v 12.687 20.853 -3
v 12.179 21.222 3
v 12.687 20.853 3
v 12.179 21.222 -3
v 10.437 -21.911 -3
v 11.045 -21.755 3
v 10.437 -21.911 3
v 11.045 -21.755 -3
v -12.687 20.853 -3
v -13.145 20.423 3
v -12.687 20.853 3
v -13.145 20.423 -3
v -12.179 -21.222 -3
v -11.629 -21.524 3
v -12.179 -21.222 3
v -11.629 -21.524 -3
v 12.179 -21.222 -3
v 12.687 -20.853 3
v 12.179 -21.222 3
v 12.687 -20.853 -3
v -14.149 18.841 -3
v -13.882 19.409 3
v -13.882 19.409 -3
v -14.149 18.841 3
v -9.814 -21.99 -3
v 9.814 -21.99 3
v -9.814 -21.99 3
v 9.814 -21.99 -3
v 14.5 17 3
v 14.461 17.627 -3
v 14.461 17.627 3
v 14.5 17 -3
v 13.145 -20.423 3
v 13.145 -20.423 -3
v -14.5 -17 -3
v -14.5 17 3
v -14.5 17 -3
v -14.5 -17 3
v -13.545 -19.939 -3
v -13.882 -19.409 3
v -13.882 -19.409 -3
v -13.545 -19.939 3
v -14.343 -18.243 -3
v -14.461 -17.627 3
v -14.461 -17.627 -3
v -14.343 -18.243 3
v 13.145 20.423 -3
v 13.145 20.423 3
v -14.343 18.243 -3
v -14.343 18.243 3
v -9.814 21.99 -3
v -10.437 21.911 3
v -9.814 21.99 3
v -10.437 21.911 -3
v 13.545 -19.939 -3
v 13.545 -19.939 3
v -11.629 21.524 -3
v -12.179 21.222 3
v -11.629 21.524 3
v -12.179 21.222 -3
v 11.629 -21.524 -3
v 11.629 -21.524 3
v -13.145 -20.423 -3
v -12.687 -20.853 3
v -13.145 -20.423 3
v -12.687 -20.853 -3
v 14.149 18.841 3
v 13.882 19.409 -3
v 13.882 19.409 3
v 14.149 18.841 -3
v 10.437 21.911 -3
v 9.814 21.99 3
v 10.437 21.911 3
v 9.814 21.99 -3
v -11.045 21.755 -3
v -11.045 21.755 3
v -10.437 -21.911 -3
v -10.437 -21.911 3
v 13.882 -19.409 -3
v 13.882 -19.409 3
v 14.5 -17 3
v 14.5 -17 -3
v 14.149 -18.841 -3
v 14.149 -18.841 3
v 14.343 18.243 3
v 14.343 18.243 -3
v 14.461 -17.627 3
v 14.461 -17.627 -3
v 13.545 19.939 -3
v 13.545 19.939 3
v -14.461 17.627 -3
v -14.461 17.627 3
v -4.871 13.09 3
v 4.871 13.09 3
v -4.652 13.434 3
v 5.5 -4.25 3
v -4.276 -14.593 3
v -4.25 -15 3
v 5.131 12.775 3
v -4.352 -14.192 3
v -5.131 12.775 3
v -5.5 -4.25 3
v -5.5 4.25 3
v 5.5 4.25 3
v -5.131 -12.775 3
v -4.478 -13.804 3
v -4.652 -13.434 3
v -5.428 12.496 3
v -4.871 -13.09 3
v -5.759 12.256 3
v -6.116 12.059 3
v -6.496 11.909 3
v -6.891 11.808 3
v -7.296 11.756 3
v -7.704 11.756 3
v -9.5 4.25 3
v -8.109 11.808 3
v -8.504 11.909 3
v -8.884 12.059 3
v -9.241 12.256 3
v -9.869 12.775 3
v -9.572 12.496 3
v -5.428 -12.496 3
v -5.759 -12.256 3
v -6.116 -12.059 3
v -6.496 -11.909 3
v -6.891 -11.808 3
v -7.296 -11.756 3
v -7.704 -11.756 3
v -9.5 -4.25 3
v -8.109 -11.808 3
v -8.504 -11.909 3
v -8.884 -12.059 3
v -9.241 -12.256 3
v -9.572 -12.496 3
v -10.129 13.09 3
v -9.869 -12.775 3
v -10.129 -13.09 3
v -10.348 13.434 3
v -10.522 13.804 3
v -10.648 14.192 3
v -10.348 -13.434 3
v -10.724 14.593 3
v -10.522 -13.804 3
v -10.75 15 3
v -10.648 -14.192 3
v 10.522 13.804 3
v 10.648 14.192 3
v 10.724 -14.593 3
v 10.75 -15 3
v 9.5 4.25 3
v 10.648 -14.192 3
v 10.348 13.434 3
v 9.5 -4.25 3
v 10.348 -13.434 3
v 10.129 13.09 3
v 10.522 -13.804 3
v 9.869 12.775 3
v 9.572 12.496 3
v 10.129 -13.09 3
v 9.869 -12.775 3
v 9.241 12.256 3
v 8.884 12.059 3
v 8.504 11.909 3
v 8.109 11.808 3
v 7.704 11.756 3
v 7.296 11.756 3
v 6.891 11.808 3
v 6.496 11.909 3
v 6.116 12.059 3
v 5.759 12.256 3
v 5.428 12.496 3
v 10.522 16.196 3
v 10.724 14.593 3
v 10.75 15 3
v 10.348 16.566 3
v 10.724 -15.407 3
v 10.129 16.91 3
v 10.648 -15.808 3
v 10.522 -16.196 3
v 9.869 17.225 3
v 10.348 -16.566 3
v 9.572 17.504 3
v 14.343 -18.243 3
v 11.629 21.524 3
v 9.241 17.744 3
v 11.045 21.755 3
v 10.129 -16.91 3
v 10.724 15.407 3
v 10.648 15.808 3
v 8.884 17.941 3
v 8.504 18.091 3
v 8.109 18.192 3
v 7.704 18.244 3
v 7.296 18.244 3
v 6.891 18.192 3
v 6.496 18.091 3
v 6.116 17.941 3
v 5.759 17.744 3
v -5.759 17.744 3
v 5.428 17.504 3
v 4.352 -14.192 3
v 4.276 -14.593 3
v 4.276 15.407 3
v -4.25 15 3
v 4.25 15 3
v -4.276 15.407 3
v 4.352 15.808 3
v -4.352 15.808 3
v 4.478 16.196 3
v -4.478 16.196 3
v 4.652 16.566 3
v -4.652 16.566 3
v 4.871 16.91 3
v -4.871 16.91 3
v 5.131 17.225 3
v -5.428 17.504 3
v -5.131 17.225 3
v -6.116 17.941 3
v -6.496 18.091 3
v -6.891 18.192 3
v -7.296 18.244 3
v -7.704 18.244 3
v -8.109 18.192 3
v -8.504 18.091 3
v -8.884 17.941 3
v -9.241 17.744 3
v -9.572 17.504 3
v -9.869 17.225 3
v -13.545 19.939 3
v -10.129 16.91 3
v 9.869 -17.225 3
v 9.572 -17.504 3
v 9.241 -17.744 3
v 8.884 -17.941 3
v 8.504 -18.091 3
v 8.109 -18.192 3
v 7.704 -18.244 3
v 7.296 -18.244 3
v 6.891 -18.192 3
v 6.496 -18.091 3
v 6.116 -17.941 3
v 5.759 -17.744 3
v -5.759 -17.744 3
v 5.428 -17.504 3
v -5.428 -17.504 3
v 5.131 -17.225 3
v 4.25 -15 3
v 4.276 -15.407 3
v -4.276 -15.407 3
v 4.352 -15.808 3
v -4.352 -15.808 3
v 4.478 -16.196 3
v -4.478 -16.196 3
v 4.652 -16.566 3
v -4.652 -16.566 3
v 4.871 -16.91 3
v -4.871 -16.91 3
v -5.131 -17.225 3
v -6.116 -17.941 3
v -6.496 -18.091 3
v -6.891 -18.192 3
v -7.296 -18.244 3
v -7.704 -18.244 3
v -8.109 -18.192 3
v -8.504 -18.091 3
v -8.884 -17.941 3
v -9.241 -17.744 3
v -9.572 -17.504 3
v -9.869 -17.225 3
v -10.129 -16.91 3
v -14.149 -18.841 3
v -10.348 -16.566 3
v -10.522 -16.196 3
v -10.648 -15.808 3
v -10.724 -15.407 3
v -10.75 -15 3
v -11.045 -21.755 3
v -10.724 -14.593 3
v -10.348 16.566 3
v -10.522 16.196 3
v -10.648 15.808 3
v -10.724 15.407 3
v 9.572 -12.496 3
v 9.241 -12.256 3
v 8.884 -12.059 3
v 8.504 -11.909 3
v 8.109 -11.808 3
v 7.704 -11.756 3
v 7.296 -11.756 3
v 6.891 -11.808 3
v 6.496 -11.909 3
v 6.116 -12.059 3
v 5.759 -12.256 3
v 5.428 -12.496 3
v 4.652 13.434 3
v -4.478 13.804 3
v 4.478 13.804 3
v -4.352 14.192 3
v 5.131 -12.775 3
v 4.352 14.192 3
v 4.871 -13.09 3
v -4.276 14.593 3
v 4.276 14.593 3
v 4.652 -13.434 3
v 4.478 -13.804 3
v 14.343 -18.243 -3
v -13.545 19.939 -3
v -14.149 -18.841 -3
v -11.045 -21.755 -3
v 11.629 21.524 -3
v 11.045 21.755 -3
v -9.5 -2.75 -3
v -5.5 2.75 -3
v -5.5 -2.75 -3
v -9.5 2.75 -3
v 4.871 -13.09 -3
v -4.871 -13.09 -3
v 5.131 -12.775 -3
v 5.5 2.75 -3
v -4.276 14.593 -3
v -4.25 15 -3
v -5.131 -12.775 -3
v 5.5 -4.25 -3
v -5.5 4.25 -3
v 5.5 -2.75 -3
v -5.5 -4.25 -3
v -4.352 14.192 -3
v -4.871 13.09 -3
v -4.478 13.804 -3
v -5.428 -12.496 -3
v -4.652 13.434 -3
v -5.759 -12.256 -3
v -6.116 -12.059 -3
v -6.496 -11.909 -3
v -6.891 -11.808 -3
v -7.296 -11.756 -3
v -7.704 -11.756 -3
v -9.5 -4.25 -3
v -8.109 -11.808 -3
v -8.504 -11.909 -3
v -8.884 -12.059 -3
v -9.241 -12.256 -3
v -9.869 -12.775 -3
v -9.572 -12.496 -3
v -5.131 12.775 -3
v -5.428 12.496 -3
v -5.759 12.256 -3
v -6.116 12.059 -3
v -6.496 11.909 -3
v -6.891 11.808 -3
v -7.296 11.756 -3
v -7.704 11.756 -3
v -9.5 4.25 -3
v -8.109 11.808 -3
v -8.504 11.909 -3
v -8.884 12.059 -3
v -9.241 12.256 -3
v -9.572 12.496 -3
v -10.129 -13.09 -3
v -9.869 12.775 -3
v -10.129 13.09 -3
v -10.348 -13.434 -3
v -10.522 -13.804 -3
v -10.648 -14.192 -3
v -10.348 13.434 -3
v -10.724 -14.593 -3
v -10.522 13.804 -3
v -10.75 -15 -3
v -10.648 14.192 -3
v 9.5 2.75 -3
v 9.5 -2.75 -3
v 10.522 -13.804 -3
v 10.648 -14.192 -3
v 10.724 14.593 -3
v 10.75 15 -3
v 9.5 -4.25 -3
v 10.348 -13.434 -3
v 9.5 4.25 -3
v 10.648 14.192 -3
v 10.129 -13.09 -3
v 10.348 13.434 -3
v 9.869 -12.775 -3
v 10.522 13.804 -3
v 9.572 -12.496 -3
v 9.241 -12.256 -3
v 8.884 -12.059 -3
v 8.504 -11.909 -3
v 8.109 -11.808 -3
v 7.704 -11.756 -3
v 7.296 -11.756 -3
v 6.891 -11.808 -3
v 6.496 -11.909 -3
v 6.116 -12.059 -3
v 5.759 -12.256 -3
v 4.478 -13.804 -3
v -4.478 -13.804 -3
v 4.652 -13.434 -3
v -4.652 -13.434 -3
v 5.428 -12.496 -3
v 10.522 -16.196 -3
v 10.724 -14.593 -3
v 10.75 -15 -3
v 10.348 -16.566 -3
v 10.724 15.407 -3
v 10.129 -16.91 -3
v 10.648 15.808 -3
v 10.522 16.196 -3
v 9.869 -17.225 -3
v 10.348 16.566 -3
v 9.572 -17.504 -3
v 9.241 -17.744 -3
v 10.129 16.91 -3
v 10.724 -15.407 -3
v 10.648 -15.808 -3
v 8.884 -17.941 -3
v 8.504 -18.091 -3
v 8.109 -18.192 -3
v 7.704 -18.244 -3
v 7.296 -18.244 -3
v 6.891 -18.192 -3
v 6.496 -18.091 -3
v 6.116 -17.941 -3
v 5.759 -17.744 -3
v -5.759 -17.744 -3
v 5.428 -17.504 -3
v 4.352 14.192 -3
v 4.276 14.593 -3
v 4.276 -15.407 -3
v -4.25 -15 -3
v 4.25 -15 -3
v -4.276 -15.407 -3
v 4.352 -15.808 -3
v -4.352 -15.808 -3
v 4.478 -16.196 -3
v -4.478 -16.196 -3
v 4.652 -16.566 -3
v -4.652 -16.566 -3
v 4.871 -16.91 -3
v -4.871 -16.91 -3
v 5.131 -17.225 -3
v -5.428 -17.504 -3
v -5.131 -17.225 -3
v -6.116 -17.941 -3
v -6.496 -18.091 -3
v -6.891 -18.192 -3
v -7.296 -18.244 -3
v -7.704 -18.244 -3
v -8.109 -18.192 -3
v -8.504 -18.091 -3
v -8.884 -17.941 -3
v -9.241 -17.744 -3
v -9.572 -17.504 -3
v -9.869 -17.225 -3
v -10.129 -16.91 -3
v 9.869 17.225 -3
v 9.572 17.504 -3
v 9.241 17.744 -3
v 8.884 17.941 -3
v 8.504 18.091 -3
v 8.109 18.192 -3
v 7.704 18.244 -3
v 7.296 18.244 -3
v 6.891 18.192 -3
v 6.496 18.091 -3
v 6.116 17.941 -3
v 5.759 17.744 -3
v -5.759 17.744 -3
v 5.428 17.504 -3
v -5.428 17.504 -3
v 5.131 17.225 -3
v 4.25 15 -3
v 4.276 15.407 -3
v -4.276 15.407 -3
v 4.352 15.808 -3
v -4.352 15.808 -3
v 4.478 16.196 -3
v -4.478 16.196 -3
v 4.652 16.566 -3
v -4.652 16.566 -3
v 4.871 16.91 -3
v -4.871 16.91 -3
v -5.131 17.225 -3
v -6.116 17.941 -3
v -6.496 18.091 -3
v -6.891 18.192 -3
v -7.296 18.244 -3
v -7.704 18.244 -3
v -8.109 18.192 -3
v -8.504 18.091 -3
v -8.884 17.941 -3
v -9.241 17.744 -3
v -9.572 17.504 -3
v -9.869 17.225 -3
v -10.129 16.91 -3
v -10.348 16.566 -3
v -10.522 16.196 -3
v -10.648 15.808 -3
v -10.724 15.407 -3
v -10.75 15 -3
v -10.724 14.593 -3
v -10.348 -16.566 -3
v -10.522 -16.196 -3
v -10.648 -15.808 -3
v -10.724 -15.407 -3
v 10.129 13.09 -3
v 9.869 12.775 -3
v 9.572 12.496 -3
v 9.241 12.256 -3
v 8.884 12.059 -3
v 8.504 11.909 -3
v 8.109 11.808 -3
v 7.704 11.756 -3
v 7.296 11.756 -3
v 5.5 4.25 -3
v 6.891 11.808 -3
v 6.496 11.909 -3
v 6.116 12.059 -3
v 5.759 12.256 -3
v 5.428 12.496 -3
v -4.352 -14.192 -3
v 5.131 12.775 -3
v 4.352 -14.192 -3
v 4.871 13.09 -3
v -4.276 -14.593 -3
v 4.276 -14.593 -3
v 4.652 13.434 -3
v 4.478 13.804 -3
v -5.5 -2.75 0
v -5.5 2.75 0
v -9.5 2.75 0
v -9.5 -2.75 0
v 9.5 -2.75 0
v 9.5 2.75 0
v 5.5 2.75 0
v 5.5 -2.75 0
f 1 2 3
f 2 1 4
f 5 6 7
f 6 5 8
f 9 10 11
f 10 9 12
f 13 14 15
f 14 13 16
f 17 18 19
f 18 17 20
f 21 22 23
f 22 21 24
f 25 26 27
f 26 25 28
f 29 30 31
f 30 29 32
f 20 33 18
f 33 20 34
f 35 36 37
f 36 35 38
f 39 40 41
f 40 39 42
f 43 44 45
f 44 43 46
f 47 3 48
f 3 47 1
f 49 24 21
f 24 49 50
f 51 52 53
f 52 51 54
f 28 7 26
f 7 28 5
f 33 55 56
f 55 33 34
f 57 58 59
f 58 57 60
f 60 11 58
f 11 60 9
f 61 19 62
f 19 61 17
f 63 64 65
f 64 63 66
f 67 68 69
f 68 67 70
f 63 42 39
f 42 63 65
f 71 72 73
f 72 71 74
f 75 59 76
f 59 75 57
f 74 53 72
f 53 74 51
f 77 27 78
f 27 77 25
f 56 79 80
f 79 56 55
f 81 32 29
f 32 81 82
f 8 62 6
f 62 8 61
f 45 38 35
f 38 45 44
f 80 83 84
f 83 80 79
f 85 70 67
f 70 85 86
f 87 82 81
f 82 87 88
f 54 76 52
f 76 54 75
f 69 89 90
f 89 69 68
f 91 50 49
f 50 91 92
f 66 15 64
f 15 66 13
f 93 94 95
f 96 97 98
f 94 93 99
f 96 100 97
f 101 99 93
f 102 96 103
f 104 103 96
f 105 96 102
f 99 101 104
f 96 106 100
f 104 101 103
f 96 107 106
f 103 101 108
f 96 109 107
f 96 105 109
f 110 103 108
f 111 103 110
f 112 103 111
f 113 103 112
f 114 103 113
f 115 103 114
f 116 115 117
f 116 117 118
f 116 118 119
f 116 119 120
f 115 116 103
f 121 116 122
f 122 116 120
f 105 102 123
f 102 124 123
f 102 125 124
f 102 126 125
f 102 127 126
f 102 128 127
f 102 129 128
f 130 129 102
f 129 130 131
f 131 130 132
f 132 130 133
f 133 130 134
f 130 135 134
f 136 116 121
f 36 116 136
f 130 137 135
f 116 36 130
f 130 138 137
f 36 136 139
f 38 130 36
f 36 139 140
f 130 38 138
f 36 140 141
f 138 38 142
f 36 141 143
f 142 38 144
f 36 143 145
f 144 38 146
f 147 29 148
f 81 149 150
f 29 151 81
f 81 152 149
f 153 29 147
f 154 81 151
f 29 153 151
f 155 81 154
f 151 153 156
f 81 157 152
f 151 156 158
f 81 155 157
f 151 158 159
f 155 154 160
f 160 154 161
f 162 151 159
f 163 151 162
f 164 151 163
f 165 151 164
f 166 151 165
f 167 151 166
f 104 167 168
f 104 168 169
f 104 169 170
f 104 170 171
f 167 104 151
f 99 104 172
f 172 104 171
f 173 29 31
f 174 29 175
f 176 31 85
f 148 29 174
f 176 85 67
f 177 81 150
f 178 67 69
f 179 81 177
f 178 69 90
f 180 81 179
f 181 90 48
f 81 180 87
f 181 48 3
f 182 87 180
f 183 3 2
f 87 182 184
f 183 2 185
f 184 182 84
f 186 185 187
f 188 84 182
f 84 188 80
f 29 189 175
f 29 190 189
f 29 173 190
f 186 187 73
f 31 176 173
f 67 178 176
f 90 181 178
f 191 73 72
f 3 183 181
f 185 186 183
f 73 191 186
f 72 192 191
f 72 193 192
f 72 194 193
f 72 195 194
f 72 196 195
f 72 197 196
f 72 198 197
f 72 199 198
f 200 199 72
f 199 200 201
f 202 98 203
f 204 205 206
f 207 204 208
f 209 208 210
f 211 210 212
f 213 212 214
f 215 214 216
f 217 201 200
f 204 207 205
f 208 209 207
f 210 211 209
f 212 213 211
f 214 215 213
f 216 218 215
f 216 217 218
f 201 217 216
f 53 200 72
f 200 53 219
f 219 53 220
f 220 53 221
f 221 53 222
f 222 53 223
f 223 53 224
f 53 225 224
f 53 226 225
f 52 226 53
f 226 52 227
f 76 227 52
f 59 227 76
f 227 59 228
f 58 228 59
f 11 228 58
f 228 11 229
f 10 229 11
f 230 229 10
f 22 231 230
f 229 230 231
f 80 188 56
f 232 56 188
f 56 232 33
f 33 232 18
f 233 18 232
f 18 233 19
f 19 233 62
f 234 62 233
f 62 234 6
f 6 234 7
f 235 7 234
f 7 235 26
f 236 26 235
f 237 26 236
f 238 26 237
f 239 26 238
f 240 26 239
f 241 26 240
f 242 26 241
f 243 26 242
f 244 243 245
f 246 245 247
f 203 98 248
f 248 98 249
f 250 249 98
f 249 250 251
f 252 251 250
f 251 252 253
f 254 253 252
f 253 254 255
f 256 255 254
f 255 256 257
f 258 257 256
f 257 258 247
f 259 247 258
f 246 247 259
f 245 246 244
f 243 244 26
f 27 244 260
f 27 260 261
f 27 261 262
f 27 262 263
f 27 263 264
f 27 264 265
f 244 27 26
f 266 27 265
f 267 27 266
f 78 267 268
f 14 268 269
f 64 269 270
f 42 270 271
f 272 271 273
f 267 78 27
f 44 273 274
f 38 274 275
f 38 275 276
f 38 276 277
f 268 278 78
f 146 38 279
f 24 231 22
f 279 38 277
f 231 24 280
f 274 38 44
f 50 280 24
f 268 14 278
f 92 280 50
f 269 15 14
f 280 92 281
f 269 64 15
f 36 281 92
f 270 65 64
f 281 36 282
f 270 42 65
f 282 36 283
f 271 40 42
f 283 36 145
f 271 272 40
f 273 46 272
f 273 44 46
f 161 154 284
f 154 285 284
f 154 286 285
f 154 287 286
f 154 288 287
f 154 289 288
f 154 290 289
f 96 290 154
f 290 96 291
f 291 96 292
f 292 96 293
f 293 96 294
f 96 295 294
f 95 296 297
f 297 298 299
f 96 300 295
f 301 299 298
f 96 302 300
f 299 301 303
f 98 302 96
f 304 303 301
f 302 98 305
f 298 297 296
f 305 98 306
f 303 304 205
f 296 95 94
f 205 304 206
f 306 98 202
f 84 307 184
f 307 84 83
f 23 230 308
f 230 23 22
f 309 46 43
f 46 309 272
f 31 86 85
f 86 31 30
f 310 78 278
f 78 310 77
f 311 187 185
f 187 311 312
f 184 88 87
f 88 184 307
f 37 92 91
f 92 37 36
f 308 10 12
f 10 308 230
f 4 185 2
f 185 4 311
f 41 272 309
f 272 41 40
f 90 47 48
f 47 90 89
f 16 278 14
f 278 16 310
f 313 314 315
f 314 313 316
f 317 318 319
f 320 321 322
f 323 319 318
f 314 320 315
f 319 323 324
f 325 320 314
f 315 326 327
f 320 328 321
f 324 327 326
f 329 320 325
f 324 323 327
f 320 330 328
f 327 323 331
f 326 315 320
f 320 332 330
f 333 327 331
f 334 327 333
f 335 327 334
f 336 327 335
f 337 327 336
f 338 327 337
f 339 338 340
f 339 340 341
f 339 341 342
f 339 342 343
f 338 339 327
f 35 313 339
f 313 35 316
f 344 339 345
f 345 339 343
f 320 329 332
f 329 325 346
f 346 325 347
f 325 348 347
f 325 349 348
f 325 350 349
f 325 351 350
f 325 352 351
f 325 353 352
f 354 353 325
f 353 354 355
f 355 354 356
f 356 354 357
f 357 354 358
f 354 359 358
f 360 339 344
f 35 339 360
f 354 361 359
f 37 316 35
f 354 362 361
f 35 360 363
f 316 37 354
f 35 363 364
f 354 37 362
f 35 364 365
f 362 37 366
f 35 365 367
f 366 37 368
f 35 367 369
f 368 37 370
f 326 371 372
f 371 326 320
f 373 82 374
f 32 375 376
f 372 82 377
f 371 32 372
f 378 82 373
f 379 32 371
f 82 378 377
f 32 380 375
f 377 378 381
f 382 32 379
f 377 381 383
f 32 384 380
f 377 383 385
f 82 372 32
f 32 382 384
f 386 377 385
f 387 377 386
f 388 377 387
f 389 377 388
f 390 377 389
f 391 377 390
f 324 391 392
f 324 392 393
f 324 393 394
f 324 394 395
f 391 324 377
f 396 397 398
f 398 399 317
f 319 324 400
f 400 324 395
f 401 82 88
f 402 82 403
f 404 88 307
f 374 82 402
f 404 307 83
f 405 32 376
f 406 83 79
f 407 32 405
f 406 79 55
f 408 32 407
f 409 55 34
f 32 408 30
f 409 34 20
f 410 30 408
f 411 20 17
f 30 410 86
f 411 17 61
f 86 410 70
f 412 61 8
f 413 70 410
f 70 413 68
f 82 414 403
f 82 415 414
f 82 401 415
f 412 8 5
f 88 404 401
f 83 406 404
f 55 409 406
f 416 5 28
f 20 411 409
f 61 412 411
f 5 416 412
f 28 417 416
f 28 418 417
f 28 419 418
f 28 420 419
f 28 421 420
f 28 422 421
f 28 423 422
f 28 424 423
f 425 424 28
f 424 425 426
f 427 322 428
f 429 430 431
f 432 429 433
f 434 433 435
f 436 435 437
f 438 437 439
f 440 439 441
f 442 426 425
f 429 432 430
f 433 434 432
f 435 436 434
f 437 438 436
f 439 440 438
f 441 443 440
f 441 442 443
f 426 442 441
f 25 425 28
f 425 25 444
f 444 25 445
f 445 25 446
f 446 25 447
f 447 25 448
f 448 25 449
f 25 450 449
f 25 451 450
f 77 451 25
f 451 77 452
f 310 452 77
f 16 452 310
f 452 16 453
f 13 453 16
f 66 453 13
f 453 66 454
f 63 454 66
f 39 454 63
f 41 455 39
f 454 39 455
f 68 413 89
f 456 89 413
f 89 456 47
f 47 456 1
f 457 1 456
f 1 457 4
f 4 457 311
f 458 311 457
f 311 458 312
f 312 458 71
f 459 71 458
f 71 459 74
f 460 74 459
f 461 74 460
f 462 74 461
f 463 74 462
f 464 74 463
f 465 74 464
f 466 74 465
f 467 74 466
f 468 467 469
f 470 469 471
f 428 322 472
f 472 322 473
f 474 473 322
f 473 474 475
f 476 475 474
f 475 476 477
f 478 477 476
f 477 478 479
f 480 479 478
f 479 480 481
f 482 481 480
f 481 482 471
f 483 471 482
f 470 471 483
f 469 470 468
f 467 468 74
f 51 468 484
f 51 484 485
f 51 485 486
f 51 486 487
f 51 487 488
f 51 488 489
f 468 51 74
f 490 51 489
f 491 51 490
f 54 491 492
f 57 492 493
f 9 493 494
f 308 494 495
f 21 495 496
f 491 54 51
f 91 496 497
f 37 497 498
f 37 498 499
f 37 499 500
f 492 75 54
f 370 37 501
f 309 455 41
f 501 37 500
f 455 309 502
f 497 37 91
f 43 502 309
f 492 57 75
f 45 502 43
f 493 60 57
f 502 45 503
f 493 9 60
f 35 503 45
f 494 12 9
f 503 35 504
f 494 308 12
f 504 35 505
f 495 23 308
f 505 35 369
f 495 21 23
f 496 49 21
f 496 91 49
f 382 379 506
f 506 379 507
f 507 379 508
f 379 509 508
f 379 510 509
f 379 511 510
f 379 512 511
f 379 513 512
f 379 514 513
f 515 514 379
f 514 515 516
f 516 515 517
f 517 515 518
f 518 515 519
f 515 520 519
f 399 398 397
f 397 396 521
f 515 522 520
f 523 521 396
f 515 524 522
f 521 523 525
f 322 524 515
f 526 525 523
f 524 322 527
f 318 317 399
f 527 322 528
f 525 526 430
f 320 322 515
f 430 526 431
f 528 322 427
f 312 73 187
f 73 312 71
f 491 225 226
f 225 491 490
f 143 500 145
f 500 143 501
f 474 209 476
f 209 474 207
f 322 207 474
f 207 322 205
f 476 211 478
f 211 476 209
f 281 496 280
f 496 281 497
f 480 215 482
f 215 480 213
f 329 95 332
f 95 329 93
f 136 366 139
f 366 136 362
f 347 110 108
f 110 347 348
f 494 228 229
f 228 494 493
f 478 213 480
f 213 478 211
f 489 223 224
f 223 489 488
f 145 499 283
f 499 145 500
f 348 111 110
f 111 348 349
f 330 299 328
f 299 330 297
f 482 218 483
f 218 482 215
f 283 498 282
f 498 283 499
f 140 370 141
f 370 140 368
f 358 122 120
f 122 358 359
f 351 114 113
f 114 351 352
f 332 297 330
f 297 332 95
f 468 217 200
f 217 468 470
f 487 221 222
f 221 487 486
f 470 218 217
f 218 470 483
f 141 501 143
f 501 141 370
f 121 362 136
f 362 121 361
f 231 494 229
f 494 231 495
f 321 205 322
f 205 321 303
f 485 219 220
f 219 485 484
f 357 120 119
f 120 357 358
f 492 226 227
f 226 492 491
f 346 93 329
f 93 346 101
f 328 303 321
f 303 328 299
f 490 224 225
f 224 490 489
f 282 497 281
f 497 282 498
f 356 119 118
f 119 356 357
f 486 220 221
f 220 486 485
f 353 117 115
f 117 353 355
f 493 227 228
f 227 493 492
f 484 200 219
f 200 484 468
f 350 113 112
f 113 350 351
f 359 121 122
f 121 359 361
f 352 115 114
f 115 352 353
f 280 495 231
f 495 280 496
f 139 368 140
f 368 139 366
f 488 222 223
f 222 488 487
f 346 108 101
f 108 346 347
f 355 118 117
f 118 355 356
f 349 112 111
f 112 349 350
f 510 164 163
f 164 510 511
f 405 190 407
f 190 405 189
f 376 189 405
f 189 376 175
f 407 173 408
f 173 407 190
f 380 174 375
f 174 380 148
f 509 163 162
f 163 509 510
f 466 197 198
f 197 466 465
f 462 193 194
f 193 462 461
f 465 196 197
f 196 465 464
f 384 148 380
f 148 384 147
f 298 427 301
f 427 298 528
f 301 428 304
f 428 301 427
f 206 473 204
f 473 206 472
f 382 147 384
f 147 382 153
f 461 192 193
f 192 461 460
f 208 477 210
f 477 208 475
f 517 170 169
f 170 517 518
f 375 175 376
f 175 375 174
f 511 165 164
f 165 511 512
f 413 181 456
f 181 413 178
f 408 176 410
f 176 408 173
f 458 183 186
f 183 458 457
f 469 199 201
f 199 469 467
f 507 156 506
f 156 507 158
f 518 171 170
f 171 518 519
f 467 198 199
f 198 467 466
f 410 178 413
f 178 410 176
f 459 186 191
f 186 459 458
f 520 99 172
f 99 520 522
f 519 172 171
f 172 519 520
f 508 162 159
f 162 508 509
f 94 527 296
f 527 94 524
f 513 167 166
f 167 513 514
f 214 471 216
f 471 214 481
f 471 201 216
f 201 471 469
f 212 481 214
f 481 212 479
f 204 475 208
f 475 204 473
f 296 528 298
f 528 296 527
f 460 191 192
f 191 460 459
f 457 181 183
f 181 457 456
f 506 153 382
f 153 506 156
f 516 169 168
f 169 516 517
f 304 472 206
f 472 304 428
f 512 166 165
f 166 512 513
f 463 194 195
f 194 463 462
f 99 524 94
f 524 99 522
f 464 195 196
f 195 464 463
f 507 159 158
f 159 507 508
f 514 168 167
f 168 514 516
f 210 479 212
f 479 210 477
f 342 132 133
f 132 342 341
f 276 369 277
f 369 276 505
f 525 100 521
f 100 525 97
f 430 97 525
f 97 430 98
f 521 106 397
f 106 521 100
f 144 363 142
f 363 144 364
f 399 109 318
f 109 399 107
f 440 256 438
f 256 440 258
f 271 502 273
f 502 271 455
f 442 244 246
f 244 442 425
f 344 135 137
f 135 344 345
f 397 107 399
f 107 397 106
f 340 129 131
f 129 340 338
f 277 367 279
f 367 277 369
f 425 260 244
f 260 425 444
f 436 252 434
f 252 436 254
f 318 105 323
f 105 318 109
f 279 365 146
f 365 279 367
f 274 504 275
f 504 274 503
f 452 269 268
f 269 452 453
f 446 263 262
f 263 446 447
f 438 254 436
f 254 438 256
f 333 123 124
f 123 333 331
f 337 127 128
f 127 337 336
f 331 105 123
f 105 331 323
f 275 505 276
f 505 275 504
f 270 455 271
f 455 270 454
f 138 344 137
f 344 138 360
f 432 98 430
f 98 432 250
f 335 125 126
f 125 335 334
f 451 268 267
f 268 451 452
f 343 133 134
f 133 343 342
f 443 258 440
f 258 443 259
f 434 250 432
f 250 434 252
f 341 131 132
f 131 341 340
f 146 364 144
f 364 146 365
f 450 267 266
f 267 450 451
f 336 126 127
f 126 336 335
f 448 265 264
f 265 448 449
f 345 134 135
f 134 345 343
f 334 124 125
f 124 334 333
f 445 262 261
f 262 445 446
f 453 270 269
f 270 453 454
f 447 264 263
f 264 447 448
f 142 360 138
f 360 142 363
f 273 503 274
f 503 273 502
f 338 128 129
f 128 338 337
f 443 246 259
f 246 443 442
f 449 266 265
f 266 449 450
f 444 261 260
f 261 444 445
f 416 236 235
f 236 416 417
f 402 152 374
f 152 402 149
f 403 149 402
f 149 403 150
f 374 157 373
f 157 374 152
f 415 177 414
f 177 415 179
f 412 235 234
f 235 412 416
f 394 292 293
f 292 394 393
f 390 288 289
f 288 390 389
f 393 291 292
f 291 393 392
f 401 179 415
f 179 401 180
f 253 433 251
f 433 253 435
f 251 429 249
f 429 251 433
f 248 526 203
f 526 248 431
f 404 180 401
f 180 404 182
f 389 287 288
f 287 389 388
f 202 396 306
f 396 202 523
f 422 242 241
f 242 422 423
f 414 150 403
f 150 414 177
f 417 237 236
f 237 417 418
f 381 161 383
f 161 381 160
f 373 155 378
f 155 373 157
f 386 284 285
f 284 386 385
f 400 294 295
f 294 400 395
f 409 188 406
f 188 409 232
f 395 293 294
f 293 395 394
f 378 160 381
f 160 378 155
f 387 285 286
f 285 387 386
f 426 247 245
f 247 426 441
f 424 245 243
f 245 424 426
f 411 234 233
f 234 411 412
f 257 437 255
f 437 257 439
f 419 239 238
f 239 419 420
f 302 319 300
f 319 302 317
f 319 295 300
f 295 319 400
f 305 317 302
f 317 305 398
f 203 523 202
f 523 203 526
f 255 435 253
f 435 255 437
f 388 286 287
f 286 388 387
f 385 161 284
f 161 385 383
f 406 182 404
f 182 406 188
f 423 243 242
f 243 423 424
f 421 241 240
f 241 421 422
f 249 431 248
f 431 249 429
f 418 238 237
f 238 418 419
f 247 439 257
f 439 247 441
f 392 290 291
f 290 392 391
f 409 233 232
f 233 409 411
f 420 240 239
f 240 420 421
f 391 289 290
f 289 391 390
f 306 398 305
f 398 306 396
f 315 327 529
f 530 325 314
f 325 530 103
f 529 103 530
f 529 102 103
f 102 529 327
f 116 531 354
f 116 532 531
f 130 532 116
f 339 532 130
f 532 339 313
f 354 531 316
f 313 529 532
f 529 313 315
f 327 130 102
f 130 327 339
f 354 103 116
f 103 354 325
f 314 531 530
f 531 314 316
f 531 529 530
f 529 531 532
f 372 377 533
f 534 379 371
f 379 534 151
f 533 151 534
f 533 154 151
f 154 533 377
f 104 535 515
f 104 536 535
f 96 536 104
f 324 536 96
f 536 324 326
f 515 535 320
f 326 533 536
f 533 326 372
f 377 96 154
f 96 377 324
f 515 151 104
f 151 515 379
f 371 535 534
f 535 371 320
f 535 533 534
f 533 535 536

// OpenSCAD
$fn = 50;


difference() {
	union() {
		translate(v = [0, 0, -3.0000000000]) {
			hull() {
				translate(v = [-9.5000000000, 17.0000000000, 0]) {
					cylinder(h = 6, r = 5);
				}
				translate(v = [9.5000000000, 17.0000000000, 0]) {
					cylinder(h = 6, r = 5);
				}
				translate(v = [-9.5000000000, -17.0000000000, 0]) {
					cylinder(h = 6, r = 5);
				}
				translate(v = [9.5000000000, -17.0000000000, 0]) {
					cylinder(h = 6, r = 5);
				}
			}
		}
		translate(v = [0, 0, -3.0000000000]) {
			hull() {
				translate(v = [-9.5000000000, 17.0000000000, 0]) {
					cylinder(h = 6, r = 5);
				}
				translate(v = [9.5000000000, 17.0000000000, 0]) {
					cylinder(h = 6, r = 5);
				}
				translate(v = [-9.5000000000, -17.0000000000, 0]) {
					cylinder(h = 6, r = 5);
				}
				translate(v = [9.5000000000, -17.0000000000, 0]) {
					cylinder(h = 6, r = 5);
				}
			}
		}
	}
	union() {
		translate(v = [-7.5000000000, 15.0000000000, -100.0000000000]) {
			cylinder(h = 200, r = 3.2500000000);
		}
		translate(v = [7.5000000000, 15.0000000000, -100.0000000000]) {
			cylinder(h = 200, r = 3.2500000000);
		}
		translate(v = [-7.5000000000, -15.0000000000, -100.0000000000]) {
			cylinder(h = 200, r = 3.2500000000);
		}
		translate(v = [7.5000000000, -15.0000000000, -100.0000000000]) {
			cylinder(h = 200, r = 3.2500000000);
		}
		translate(v = [-9.5000000000, -4.2500000000, -50]) {
			cube(size = [4, 1.5000000000, 100]);
		}
		translate(v = [-9.5000000000, 2.7500000000, -50]) {
			cube(size = [4, 1.5000000000, 100]);
		}
		translate(v = [-9.5000000000, -4.2500000000, 0]) {
			cube(size = [4, 8.5000000000, 3]);
		}
		translate(v = [5.5000000000, -4.2500000000, -50]) {
			cube(size = [4, 1.5000000000, 100]);
		}
		translate(v = [5.5000000000, 2.7500000000, -50]) {
			cube(size = [4, 1.5000000000, 100]);
		}
		translate(v = [5.5000000000, -4.2500000000, 0]) {
			cube(size = [4, 8.5000000000, 3]);
		}
	}
}
